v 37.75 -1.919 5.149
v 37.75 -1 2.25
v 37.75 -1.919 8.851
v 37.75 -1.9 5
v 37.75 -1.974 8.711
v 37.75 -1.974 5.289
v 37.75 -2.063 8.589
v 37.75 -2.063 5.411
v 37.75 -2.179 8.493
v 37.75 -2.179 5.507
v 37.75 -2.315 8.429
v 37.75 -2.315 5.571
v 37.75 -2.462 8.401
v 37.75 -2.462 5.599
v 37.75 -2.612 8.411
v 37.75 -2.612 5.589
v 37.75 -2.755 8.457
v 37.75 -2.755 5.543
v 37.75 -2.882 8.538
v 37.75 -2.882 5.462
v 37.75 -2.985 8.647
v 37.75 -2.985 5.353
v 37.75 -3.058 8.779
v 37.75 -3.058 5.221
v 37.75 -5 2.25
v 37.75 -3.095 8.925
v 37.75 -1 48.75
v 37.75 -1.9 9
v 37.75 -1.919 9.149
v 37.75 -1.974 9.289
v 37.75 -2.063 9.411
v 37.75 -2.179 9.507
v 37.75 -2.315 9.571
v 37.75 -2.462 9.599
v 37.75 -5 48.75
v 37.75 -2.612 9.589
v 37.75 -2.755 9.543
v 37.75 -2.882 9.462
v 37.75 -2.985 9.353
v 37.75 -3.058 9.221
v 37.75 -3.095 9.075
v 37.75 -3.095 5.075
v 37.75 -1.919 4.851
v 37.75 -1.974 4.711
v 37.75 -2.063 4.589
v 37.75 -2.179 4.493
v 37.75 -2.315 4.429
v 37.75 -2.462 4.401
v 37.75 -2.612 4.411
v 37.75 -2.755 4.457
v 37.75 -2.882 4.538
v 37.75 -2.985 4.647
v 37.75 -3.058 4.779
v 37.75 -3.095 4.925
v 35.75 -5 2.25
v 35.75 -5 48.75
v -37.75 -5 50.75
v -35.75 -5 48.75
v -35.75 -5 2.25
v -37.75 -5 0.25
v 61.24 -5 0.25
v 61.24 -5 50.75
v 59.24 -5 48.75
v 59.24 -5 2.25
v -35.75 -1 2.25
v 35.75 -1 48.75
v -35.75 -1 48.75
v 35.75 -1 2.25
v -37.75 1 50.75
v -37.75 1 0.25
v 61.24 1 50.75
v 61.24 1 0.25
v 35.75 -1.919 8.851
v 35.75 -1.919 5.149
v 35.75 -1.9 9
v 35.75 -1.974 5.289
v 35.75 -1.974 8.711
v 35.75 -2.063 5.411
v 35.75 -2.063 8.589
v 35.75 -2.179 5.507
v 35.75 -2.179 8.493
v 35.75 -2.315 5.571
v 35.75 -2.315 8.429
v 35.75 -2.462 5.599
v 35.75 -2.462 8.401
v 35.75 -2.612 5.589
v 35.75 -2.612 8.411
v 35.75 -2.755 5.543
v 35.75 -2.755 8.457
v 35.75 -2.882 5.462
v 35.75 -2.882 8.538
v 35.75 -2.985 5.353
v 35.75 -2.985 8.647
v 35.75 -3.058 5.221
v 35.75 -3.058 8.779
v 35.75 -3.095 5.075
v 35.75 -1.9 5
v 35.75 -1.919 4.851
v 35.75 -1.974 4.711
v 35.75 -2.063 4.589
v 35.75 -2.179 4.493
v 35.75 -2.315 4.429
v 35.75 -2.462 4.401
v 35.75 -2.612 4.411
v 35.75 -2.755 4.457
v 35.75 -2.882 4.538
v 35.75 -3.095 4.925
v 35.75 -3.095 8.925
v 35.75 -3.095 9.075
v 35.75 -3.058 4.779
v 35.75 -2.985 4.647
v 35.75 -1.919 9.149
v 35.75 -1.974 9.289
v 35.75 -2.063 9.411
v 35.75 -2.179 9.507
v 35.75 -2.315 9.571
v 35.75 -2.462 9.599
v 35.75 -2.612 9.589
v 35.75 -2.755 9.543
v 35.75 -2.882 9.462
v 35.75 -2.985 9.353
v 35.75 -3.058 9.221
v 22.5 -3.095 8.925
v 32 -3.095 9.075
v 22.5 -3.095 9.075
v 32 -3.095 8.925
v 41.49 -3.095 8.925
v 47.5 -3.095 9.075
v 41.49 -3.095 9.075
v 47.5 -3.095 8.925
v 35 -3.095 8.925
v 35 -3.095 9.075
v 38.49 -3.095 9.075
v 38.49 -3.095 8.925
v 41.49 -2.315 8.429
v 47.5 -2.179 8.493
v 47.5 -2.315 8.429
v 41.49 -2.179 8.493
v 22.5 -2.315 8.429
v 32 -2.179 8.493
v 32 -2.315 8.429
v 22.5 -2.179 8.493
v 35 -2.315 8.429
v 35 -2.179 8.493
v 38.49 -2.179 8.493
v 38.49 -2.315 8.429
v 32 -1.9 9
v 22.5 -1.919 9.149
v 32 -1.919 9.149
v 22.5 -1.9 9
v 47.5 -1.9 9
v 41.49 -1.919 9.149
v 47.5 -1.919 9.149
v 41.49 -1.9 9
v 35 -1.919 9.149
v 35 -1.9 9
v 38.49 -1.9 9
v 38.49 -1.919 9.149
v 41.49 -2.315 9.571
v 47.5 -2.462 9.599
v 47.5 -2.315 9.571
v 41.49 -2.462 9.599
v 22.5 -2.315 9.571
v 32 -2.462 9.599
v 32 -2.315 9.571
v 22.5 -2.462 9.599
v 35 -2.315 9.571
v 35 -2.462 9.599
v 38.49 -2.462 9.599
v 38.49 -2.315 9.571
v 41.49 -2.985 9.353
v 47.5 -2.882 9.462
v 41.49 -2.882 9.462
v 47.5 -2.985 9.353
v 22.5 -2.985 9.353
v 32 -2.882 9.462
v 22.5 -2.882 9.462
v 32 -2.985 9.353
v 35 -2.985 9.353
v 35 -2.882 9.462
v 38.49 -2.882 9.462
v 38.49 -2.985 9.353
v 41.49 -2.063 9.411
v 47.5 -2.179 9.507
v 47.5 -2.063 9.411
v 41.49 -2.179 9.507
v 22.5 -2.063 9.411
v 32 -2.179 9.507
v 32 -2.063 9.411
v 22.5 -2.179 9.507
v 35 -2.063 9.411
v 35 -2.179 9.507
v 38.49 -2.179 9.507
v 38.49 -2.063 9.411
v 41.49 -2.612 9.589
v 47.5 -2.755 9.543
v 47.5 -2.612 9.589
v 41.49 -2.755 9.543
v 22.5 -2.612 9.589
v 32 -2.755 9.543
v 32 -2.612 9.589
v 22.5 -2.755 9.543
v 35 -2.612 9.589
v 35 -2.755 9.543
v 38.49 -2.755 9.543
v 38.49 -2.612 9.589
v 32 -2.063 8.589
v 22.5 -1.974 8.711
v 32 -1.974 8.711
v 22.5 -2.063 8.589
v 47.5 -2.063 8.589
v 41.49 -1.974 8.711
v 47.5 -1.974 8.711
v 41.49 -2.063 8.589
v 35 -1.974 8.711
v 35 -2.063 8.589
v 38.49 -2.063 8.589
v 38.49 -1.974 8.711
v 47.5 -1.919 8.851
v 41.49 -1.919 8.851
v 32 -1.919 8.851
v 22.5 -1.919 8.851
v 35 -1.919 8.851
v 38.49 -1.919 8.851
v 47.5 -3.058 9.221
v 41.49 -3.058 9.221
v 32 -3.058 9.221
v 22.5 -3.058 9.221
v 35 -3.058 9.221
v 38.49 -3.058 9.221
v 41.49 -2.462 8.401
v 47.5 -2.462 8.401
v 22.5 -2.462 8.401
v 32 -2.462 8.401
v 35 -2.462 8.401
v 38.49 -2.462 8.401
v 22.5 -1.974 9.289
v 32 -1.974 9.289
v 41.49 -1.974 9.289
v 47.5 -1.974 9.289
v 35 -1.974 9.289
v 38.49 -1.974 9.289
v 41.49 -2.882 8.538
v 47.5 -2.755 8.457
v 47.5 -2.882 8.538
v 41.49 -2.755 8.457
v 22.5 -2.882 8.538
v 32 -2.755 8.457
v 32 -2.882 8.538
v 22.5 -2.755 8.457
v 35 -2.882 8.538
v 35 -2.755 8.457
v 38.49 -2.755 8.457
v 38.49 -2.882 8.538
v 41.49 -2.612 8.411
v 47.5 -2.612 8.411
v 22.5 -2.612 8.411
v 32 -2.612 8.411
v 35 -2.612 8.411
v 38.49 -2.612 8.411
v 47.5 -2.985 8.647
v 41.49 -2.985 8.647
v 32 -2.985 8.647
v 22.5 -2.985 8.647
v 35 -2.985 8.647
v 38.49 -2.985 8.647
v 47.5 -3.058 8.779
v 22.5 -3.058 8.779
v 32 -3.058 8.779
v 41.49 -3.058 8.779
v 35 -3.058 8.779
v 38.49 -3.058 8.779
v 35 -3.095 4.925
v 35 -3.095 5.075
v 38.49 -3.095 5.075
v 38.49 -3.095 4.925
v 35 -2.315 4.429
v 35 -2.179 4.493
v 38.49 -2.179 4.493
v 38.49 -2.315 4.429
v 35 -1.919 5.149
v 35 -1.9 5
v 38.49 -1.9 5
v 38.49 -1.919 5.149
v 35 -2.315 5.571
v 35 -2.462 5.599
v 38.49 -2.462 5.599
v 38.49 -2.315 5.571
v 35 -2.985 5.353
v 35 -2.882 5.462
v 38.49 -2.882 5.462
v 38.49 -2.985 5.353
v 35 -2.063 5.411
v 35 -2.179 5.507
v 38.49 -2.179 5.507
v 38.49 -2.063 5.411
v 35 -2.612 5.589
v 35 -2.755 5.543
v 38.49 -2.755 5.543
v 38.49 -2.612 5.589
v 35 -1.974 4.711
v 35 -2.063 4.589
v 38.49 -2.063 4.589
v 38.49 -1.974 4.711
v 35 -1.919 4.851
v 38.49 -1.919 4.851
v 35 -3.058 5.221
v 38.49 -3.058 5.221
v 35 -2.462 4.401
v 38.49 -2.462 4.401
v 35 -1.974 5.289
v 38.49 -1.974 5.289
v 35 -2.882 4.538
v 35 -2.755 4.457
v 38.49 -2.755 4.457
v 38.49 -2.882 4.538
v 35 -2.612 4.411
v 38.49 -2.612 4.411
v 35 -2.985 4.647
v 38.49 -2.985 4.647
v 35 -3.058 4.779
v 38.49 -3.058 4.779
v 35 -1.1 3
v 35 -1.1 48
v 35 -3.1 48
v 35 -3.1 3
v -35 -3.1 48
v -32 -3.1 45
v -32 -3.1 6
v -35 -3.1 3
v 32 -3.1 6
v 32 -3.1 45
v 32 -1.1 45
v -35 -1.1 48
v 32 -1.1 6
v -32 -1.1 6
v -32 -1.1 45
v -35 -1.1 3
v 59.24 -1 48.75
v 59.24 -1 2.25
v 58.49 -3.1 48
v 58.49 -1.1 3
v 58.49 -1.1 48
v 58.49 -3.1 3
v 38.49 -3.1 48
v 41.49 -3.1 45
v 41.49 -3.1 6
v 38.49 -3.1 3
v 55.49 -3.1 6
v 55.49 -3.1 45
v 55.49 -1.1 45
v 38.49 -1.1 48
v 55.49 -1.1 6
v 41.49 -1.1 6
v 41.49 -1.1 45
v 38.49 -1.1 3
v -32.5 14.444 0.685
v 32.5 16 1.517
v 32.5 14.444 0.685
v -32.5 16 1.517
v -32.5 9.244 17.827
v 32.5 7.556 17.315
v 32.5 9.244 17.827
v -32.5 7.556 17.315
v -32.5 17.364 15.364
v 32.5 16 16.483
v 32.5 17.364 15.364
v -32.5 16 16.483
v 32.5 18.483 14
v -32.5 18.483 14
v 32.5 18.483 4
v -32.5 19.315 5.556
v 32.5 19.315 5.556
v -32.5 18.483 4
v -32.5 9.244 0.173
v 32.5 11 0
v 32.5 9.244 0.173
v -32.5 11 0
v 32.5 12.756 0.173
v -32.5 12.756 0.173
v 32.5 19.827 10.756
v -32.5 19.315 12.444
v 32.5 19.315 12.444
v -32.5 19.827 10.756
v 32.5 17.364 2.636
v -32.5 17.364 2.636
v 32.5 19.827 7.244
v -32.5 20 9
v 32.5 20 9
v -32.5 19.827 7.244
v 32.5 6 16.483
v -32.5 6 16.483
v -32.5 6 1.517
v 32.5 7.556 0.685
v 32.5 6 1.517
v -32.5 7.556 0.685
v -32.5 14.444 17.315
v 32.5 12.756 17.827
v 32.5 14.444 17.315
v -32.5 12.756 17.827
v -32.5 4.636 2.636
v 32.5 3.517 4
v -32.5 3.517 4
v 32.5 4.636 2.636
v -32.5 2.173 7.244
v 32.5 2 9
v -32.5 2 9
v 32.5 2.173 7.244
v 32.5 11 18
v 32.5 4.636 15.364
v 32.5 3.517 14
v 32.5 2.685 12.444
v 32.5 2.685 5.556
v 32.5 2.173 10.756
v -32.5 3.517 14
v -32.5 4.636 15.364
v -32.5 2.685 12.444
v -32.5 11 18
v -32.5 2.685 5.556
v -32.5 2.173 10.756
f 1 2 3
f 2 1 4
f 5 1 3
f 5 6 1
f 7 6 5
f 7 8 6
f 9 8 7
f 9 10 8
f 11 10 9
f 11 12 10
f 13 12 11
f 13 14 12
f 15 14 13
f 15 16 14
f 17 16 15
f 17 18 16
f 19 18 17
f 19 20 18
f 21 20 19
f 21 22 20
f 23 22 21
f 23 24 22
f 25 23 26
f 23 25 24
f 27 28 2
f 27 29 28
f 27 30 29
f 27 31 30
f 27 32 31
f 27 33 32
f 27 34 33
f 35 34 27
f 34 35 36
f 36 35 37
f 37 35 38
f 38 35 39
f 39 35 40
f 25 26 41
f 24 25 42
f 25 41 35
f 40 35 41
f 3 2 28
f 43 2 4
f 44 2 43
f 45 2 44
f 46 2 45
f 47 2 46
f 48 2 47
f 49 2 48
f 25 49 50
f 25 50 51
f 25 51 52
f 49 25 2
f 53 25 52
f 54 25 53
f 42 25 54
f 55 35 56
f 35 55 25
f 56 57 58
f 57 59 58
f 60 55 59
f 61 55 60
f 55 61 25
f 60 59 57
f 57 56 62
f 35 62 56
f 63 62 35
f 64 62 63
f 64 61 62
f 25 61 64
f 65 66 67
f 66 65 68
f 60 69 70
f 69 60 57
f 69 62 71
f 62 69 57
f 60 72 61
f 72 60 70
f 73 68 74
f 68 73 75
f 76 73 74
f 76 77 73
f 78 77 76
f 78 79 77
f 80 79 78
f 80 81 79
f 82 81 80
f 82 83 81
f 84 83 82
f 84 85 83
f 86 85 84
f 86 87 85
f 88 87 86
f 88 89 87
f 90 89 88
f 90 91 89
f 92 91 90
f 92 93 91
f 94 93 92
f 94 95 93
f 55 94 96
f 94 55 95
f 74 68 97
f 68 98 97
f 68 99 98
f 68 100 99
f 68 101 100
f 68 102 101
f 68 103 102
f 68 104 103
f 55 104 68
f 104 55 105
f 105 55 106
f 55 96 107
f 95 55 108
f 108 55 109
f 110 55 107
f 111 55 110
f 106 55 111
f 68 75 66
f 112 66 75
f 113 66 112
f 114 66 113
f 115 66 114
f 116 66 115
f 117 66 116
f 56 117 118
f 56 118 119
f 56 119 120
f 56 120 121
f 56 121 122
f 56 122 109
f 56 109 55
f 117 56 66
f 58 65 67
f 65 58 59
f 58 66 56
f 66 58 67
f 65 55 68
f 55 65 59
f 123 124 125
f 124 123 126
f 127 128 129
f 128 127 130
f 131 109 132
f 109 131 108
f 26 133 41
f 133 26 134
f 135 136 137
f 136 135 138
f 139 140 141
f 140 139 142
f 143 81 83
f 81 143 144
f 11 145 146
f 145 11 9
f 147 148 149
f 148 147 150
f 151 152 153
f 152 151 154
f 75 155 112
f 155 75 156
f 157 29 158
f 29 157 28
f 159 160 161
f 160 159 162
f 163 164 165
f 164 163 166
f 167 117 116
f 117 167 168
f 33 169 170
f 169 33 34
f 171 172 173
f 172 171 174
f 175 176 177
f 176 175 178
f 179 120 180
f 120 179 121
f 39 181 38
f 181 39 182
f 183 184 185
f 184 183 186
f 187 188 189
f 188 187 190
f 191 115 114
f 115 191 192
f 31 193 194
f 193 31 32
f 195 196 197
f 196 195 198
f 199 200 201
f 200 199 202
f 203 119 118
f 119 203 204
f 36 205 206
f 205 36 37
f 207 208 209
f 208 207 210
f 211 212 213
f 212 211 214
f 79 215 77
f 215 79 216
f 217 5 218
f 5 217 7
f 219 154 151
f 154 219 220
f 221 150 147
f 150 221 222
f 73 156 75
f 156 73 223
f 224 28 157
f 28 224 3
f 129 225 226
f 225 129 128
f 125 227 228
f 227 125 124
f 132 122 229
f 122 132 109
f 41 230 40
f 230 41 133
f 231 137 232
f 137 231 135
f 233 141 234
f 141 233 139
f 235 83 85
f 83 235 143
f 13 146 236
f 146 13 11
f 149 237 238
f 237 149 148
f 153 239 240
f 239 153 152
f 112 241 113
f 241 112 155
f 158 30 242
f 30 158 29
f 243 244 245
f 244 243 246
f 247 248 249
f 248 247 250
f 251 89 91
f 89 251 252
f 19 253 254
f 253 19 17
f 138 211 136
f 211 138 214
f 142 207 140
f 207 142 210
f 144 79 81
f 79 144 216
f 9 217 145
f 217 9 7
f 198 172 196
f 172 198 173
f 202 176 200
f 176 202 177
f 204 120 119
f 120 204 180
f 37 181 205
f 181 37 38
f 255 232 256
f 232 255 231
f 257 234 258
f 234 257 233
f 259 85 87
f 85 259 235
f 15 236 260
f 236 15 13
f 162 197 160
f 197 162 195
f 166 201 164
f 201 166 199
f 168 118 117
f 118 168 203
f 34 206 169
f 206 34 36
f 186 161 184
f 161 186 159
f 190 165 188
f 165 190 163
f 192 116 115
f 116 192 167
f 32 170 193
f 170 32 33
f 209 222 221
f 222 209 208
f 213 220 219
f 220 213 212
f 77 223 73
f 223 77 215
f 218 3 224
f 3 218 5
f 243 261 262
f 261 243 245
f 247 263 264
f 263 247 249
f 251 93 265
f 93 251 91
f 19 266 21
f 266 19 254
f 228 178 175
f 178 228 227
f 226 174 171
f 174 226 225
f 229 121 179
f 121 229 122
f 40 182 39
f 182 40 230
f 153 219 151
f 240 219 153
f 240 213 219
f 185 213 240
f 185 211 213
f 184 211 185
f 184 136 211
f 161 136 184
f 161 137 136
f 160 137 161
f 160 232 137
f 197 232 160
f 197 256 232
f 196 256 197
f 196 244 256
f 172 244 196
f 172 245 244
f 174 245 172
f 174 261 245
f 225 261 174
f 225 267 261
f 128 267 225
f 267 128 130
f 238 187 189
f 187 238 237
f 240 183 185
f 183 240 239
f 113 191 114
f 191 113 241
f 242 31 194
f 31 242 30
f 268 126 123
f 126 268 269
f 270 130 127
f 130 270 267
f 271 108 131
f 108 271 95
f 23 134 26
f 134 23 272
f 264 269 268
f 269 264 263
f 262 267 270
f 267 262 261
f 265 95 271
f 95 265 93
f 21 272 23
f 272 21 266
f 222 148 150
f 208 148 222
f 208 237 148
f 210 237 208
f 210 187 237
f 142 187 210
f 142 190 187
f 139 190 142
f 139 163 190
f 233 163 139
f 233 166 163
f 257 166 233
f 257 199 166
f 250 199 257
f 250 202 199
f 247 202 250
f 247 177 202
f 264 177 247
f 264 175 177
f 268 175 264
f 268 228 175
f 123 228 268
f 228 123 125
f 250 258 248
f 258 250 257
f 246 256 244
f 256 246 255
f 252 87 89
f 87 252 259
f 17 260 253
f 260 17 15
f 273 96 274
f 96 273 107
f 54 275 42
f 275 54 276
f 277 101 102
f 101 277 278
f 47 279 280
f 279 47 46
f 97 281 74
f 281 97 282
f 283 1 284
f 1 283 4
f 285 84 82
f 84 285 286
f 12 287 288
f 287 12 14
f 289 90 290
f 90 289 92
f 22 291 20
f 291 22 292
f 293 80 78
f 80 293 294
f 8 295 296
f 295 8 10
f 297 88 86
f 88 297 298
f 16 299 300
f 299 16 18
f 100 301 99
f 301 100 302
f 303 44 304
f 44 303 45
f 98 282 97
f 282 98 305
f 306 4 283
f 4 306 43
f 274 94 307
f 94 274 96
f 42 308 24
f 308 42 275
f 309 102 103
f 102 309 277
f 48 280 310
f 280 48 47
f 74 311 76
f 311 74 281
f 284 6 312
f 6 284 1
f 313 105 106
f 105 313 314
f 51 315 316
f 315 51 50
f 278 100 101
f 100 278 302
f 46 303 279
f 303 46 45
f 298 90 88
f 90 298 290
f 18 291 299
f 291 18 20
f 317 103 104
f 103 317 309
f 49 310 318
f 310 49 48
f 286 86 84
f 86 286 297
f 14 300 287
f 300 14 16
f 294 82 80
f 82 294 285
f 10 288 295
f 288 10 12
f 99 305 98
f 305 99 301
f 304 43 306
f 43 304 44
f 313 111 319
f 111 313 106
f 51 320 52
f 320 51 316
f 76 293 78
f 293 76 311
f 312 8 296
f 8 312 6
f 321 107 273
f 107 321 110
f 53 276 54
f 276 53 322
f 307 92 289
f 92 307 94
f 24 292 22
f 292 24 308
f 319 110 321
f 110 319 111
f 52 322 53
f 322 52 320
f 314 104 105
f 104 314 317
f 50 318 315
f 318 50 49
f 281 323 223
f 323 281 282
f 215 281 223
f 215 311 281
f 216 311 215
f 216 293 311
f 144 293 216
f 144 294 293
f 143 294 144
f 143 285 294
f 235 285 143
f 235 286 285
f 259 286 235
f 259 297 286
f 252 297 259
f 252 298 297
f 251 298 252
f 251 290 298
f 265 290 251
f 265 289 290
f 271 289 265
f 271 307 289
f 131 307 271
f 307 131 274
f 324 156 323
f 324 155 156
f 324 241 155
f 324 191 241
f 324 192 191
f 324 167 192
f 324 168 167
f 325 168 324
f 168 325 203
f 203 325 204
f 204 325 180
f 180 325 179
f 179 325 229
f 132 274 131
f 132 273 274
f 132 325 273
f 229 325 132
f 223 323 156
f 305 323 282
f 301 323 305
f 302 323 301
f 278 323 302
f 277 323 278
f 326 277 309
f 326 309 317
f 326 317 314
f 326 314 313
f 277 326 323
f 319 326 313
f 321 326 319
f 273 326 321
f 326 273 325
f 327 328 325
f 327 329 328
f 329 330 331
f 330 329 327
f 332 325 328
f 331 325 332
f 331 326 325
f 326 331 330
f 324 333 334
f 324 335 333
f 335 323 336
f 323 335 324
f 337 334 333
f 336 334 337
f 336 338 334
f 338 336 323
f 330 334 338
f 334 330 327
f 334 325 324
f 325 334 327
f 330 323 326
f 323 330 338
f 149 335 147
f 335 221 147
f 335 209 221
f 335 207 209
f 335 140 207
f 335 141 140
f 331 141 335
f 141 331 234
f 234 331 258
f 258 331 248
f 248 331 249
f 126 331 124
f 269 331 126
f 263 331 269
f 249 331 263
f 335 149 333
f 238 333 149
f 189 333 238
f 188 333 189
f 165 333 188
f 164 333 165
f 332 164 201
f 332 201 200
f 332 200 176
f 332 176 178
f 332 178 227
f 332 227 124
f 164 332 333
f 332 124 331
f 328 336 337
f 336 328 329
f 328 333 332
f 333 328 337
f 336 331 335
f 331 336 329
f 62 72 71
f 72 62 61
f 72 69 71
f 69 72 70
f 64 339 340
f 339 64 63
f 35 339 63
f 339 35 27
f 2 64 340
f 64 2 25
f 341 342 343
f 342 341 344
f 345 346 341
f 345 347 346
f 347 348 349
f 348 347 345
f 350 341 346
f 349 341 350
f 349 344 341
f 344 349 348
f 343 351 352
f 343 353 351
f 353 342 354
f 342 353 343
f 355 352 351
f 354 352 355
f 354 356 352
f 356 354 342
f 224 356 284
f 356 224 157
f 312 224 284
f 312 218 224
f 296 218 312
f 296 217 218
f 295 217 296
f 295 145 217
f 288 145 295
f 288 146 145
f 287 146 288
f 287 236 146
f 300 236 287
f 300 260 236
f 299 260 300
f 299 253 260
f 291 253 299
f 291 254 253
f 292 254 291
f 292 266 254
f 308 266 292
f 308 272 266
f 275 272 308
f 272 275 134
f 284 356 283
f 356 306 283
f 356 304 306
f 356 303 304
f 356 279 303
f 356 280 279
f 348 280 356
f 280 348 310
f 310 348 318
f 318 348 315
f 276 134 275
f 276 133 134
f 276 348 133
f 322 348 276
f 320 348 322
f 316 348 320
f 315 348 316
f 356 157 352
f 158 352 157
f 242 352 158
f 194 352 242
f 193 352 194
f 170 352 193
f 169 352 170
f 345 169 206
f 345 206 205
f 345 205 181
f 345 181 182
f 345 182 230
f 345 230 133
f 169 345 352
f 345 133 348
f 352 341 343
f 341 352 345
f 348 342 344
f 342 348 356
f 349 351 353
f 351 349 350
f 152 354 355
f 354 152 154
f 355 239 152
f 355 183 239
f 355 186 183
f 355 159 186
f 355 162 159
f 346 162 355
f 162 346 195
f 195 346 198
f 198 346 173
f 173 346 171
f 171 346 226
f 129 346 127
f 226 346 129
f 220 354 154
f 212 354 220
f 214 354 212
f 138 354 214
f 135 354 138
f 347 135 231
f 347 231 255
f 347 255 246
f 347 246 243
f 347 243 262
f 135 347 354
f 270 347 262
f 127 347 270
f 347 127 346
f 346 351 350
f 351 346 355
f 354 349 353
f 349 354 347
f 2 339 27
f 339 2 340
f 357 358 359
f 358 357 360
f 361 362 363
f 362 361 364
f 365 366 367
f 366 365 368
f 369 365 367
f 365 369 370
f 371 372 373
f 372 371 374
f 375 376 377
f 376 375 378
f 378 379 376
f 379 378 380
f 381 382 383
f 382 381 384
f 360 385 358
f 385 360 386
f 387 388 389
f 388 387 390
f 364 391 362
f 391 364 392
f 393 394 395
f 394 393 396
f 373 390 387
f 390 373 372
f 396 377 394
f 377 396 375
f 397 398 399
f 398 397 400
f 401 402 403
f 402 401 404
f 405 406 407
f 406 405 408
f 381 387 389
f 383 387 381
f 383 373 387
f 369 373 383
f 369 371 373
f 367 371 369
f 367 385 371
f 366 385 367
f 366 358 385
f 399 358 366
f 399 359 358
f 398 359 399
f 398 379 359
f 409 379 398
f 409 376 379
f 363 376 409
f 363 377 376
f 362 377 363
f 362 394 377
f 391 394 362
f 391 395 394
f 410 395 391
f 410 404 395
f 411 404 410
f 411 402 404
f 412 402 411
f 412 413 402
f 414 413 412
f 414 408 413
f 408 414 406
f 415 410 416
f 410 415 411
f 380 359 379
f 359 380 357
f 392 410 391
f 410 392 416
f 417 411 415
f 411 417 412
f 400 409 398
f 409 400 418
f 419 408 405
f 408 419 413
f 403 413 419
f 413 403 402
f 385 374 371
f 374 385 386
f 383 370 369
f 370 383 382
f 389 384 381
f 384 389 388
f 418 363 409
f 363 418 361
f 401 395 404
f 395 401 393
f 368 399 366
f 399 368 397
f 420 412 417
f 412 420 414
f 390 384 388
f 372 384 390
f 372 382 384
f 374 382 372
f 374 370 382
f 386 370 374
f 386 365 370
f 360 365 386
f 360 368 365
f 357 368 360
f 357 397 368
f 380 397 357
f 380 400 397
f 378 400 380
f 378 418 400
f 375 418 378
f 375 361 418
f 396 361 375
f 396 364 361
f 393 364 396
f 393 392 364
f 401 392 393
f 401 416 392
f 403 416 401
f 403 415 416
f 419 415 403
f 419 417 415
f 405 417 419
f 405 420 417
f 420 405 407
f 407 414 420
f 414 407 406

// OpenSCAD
// file: controller.scad
w_back = 70;
h_back = 45;
w_controller = 20;
thickness_bottom = 2;
thickness_top = 2;
widht_frame_window = 3;

h_walls = 4;
thickness_walls = 2;
gap_backligh = 1.5;

//kit_controller();
//walls(); 
//debug_controller();
test_print_walls_frame();

module test_print_walls_frame() {
    frame_controller();
    translate([-w_controller-widht_frame_window-2, 0, h_walls/2])
    walls();
}

module frame_controller() {
difference() {
    cube([w_controller, h_back, thickness_top], center=true);
    cube([w_controller-2*widht_frame_window, h_back-2*widht_frame_window, thickness_top+1], center=true);
 }
}

module debug_controller() {
difference() {
    kit_controller();
    translate([-w_controller/2, 0, h_walls/2])
    cube([w_controller, h_back+2*thickness_walls+gap_backligh   +1, 2*h_walls], center=true);
 }
}
module kit_controller() {
    controller();
    translate([0, 0, h_walls/2])
    walls(); 
    color("green")
    translate([0, 0, thickness_bottom+0.1])
    frame_controller();
}

module walls() {
difference() {
    cube([w_controller + 2*thickness_walls+gap_backligh, h_back + 2*thickness_walls+gap_backligh, thickness_bottom + h_walls], center=true);
    color("red")
    cube([w_controller+gap_backligh, h_back+gap_backligh, thickness_bottom + h_walls + 1], center=true);
    translate([-w_controller-thickness_walls+gap_backligh/2-0.25, 0, 0])
    cube([w_controller+gap_backligh, h_back+gap_backligh+2*thickness_walls+1, thickness_bottom+h_walls+1], center=true);
 }
}

module controller(){
cube([w_controller+gap_backligh, h_back+gap_backligh, thickness_bottom], center=true);
}
// file: akkum18650.scad
echo("Работа Полина Тугбаева");
d_akkum=18;
h_akkum=65;

twoAcc();

module twoAcc() {
translate([0, -d_akkum/2-1, d_akkum/2+1])
rotate([0, 90, 0])
akkum18650();
    
translate([0, d_akkum/2+1, d_akkum/2+1])
rotate([0, 90, 0])
akkum18650();
    
translate([-33, -10, 0])
import("flexbatter18650x2.stl");
}

module akkum18650() {
color("violet")
cylinder(d=d_akkum, h=h_akkum, $fn=32, center=true);
}
// file: frame.scad
use <akkum18650.scad>
use <controller.scad>

echo("Работа Полина Тугбаева");
d_akkum=18;
h_akkum=65;
d_wires=1.2;

thickness_frame = 4;
thickness_walls = 2;
thickness_bottom = 2;
thickness_top = 2;
widht_frame_window = 3;

w_back = 70;
h_back = 45;
thickness_back = 1;
h_walls = 4;
gap_backlight = 1.5;
w_controller = 20;

//kit_frame();

frame_controller();
//translate([1, 0, 0])
//debug_controller(); 
//frame_debug(); 
//translate([0, 0, thickness_bottom/2+thickness_top/2])
//window_frame();
//walls();

module for_wires() {
    for(i=[1:6]) {
        echo("i = ", i);
        translate([i*3, 0, 0])
        color("red")
        cylinder(h=30, d=2, center=true, $fn=32);
 }
}

module window_frame(){
difference() {
    color("green")
    cube([w_back, h_back, thickness_top], center=true);
    color("red")
    cube([w_back-2*widht_frame_window, h_back-2*widht_frame_window, thickness_top+1], center=true);
 }
}

module frame_debug() {
difference() {
    kit_frame();
    translate([w_back/2, 0, h_walls-thickness_bottom])
    cube([w_back, h_back+2*thickness_walls+2, 2*h_walls], center=true);
 }
}
    
module kit_frame(){
    bottom();
    //color("green")
    translate([0,0,h_walls/2+thickness_bottom/2])
    walls();
    wires();
    translate([0, 0, thickness_bottom/2+thickness_top/2+0.1])
    window_frame();
    translate([w_back/2+w_controller/2+2*thickness_walls-0.51, 0,])
    kit_controller();
}

module wires() {
    translate([w_back/2, -h_back/2+6, h_walls/2+0.5])
    rotate([0, 90, 0])
    color("red")
    cylinder(d=d_wires, h=25, center=true, $fn=25);
    
    translate([w_back/2, -h_back/2+2, h_walls/2+0.5])
    rotate([0, 90, 0])
    color("black")
    cylinder(d=d_wires, h=25, center=true, $fn=25);
}

module walls(){
    difference(){
        cube([w_back+2*thickness_walls+gap_backlight, h_back+2*thickness_walls+gap_backlight, h_walls], center = true);
        color("red")
        cube([w_back+gap_backlight, h_back+gap_backlight, h_walls+1], center = true);
    }
}
module backlight(){
    color("lightgreen")
    cube([w_back, h_back, thickness_back], center = true);
}

module bottom(){
    cube([w_back+2*thickness_walls+gap_backlight, h_back+2*thickness_walls+gap_backlight, thickness_bottom], center = true);
}
// main file
use <frame.scad>
use <akkum18650.scad>

d_akkum = 18;
h_akkum = 65;

gap_backlight = 1.5;
thickness_bottom = 2;

w_back = 70;
h_back = 45;

echo("Работа Полина Тугбаева");
build_frame();

module build_frame() {
    translate([0, 0, h_back/2+2*gap_backlight])
    rotate([90, 0, 0])
    kit_frame();
    translate([0, d_akkum/2+thickness_bottom, d_akkum/2])
    rotate([0, 90, 0])
    akkum18650();
}
